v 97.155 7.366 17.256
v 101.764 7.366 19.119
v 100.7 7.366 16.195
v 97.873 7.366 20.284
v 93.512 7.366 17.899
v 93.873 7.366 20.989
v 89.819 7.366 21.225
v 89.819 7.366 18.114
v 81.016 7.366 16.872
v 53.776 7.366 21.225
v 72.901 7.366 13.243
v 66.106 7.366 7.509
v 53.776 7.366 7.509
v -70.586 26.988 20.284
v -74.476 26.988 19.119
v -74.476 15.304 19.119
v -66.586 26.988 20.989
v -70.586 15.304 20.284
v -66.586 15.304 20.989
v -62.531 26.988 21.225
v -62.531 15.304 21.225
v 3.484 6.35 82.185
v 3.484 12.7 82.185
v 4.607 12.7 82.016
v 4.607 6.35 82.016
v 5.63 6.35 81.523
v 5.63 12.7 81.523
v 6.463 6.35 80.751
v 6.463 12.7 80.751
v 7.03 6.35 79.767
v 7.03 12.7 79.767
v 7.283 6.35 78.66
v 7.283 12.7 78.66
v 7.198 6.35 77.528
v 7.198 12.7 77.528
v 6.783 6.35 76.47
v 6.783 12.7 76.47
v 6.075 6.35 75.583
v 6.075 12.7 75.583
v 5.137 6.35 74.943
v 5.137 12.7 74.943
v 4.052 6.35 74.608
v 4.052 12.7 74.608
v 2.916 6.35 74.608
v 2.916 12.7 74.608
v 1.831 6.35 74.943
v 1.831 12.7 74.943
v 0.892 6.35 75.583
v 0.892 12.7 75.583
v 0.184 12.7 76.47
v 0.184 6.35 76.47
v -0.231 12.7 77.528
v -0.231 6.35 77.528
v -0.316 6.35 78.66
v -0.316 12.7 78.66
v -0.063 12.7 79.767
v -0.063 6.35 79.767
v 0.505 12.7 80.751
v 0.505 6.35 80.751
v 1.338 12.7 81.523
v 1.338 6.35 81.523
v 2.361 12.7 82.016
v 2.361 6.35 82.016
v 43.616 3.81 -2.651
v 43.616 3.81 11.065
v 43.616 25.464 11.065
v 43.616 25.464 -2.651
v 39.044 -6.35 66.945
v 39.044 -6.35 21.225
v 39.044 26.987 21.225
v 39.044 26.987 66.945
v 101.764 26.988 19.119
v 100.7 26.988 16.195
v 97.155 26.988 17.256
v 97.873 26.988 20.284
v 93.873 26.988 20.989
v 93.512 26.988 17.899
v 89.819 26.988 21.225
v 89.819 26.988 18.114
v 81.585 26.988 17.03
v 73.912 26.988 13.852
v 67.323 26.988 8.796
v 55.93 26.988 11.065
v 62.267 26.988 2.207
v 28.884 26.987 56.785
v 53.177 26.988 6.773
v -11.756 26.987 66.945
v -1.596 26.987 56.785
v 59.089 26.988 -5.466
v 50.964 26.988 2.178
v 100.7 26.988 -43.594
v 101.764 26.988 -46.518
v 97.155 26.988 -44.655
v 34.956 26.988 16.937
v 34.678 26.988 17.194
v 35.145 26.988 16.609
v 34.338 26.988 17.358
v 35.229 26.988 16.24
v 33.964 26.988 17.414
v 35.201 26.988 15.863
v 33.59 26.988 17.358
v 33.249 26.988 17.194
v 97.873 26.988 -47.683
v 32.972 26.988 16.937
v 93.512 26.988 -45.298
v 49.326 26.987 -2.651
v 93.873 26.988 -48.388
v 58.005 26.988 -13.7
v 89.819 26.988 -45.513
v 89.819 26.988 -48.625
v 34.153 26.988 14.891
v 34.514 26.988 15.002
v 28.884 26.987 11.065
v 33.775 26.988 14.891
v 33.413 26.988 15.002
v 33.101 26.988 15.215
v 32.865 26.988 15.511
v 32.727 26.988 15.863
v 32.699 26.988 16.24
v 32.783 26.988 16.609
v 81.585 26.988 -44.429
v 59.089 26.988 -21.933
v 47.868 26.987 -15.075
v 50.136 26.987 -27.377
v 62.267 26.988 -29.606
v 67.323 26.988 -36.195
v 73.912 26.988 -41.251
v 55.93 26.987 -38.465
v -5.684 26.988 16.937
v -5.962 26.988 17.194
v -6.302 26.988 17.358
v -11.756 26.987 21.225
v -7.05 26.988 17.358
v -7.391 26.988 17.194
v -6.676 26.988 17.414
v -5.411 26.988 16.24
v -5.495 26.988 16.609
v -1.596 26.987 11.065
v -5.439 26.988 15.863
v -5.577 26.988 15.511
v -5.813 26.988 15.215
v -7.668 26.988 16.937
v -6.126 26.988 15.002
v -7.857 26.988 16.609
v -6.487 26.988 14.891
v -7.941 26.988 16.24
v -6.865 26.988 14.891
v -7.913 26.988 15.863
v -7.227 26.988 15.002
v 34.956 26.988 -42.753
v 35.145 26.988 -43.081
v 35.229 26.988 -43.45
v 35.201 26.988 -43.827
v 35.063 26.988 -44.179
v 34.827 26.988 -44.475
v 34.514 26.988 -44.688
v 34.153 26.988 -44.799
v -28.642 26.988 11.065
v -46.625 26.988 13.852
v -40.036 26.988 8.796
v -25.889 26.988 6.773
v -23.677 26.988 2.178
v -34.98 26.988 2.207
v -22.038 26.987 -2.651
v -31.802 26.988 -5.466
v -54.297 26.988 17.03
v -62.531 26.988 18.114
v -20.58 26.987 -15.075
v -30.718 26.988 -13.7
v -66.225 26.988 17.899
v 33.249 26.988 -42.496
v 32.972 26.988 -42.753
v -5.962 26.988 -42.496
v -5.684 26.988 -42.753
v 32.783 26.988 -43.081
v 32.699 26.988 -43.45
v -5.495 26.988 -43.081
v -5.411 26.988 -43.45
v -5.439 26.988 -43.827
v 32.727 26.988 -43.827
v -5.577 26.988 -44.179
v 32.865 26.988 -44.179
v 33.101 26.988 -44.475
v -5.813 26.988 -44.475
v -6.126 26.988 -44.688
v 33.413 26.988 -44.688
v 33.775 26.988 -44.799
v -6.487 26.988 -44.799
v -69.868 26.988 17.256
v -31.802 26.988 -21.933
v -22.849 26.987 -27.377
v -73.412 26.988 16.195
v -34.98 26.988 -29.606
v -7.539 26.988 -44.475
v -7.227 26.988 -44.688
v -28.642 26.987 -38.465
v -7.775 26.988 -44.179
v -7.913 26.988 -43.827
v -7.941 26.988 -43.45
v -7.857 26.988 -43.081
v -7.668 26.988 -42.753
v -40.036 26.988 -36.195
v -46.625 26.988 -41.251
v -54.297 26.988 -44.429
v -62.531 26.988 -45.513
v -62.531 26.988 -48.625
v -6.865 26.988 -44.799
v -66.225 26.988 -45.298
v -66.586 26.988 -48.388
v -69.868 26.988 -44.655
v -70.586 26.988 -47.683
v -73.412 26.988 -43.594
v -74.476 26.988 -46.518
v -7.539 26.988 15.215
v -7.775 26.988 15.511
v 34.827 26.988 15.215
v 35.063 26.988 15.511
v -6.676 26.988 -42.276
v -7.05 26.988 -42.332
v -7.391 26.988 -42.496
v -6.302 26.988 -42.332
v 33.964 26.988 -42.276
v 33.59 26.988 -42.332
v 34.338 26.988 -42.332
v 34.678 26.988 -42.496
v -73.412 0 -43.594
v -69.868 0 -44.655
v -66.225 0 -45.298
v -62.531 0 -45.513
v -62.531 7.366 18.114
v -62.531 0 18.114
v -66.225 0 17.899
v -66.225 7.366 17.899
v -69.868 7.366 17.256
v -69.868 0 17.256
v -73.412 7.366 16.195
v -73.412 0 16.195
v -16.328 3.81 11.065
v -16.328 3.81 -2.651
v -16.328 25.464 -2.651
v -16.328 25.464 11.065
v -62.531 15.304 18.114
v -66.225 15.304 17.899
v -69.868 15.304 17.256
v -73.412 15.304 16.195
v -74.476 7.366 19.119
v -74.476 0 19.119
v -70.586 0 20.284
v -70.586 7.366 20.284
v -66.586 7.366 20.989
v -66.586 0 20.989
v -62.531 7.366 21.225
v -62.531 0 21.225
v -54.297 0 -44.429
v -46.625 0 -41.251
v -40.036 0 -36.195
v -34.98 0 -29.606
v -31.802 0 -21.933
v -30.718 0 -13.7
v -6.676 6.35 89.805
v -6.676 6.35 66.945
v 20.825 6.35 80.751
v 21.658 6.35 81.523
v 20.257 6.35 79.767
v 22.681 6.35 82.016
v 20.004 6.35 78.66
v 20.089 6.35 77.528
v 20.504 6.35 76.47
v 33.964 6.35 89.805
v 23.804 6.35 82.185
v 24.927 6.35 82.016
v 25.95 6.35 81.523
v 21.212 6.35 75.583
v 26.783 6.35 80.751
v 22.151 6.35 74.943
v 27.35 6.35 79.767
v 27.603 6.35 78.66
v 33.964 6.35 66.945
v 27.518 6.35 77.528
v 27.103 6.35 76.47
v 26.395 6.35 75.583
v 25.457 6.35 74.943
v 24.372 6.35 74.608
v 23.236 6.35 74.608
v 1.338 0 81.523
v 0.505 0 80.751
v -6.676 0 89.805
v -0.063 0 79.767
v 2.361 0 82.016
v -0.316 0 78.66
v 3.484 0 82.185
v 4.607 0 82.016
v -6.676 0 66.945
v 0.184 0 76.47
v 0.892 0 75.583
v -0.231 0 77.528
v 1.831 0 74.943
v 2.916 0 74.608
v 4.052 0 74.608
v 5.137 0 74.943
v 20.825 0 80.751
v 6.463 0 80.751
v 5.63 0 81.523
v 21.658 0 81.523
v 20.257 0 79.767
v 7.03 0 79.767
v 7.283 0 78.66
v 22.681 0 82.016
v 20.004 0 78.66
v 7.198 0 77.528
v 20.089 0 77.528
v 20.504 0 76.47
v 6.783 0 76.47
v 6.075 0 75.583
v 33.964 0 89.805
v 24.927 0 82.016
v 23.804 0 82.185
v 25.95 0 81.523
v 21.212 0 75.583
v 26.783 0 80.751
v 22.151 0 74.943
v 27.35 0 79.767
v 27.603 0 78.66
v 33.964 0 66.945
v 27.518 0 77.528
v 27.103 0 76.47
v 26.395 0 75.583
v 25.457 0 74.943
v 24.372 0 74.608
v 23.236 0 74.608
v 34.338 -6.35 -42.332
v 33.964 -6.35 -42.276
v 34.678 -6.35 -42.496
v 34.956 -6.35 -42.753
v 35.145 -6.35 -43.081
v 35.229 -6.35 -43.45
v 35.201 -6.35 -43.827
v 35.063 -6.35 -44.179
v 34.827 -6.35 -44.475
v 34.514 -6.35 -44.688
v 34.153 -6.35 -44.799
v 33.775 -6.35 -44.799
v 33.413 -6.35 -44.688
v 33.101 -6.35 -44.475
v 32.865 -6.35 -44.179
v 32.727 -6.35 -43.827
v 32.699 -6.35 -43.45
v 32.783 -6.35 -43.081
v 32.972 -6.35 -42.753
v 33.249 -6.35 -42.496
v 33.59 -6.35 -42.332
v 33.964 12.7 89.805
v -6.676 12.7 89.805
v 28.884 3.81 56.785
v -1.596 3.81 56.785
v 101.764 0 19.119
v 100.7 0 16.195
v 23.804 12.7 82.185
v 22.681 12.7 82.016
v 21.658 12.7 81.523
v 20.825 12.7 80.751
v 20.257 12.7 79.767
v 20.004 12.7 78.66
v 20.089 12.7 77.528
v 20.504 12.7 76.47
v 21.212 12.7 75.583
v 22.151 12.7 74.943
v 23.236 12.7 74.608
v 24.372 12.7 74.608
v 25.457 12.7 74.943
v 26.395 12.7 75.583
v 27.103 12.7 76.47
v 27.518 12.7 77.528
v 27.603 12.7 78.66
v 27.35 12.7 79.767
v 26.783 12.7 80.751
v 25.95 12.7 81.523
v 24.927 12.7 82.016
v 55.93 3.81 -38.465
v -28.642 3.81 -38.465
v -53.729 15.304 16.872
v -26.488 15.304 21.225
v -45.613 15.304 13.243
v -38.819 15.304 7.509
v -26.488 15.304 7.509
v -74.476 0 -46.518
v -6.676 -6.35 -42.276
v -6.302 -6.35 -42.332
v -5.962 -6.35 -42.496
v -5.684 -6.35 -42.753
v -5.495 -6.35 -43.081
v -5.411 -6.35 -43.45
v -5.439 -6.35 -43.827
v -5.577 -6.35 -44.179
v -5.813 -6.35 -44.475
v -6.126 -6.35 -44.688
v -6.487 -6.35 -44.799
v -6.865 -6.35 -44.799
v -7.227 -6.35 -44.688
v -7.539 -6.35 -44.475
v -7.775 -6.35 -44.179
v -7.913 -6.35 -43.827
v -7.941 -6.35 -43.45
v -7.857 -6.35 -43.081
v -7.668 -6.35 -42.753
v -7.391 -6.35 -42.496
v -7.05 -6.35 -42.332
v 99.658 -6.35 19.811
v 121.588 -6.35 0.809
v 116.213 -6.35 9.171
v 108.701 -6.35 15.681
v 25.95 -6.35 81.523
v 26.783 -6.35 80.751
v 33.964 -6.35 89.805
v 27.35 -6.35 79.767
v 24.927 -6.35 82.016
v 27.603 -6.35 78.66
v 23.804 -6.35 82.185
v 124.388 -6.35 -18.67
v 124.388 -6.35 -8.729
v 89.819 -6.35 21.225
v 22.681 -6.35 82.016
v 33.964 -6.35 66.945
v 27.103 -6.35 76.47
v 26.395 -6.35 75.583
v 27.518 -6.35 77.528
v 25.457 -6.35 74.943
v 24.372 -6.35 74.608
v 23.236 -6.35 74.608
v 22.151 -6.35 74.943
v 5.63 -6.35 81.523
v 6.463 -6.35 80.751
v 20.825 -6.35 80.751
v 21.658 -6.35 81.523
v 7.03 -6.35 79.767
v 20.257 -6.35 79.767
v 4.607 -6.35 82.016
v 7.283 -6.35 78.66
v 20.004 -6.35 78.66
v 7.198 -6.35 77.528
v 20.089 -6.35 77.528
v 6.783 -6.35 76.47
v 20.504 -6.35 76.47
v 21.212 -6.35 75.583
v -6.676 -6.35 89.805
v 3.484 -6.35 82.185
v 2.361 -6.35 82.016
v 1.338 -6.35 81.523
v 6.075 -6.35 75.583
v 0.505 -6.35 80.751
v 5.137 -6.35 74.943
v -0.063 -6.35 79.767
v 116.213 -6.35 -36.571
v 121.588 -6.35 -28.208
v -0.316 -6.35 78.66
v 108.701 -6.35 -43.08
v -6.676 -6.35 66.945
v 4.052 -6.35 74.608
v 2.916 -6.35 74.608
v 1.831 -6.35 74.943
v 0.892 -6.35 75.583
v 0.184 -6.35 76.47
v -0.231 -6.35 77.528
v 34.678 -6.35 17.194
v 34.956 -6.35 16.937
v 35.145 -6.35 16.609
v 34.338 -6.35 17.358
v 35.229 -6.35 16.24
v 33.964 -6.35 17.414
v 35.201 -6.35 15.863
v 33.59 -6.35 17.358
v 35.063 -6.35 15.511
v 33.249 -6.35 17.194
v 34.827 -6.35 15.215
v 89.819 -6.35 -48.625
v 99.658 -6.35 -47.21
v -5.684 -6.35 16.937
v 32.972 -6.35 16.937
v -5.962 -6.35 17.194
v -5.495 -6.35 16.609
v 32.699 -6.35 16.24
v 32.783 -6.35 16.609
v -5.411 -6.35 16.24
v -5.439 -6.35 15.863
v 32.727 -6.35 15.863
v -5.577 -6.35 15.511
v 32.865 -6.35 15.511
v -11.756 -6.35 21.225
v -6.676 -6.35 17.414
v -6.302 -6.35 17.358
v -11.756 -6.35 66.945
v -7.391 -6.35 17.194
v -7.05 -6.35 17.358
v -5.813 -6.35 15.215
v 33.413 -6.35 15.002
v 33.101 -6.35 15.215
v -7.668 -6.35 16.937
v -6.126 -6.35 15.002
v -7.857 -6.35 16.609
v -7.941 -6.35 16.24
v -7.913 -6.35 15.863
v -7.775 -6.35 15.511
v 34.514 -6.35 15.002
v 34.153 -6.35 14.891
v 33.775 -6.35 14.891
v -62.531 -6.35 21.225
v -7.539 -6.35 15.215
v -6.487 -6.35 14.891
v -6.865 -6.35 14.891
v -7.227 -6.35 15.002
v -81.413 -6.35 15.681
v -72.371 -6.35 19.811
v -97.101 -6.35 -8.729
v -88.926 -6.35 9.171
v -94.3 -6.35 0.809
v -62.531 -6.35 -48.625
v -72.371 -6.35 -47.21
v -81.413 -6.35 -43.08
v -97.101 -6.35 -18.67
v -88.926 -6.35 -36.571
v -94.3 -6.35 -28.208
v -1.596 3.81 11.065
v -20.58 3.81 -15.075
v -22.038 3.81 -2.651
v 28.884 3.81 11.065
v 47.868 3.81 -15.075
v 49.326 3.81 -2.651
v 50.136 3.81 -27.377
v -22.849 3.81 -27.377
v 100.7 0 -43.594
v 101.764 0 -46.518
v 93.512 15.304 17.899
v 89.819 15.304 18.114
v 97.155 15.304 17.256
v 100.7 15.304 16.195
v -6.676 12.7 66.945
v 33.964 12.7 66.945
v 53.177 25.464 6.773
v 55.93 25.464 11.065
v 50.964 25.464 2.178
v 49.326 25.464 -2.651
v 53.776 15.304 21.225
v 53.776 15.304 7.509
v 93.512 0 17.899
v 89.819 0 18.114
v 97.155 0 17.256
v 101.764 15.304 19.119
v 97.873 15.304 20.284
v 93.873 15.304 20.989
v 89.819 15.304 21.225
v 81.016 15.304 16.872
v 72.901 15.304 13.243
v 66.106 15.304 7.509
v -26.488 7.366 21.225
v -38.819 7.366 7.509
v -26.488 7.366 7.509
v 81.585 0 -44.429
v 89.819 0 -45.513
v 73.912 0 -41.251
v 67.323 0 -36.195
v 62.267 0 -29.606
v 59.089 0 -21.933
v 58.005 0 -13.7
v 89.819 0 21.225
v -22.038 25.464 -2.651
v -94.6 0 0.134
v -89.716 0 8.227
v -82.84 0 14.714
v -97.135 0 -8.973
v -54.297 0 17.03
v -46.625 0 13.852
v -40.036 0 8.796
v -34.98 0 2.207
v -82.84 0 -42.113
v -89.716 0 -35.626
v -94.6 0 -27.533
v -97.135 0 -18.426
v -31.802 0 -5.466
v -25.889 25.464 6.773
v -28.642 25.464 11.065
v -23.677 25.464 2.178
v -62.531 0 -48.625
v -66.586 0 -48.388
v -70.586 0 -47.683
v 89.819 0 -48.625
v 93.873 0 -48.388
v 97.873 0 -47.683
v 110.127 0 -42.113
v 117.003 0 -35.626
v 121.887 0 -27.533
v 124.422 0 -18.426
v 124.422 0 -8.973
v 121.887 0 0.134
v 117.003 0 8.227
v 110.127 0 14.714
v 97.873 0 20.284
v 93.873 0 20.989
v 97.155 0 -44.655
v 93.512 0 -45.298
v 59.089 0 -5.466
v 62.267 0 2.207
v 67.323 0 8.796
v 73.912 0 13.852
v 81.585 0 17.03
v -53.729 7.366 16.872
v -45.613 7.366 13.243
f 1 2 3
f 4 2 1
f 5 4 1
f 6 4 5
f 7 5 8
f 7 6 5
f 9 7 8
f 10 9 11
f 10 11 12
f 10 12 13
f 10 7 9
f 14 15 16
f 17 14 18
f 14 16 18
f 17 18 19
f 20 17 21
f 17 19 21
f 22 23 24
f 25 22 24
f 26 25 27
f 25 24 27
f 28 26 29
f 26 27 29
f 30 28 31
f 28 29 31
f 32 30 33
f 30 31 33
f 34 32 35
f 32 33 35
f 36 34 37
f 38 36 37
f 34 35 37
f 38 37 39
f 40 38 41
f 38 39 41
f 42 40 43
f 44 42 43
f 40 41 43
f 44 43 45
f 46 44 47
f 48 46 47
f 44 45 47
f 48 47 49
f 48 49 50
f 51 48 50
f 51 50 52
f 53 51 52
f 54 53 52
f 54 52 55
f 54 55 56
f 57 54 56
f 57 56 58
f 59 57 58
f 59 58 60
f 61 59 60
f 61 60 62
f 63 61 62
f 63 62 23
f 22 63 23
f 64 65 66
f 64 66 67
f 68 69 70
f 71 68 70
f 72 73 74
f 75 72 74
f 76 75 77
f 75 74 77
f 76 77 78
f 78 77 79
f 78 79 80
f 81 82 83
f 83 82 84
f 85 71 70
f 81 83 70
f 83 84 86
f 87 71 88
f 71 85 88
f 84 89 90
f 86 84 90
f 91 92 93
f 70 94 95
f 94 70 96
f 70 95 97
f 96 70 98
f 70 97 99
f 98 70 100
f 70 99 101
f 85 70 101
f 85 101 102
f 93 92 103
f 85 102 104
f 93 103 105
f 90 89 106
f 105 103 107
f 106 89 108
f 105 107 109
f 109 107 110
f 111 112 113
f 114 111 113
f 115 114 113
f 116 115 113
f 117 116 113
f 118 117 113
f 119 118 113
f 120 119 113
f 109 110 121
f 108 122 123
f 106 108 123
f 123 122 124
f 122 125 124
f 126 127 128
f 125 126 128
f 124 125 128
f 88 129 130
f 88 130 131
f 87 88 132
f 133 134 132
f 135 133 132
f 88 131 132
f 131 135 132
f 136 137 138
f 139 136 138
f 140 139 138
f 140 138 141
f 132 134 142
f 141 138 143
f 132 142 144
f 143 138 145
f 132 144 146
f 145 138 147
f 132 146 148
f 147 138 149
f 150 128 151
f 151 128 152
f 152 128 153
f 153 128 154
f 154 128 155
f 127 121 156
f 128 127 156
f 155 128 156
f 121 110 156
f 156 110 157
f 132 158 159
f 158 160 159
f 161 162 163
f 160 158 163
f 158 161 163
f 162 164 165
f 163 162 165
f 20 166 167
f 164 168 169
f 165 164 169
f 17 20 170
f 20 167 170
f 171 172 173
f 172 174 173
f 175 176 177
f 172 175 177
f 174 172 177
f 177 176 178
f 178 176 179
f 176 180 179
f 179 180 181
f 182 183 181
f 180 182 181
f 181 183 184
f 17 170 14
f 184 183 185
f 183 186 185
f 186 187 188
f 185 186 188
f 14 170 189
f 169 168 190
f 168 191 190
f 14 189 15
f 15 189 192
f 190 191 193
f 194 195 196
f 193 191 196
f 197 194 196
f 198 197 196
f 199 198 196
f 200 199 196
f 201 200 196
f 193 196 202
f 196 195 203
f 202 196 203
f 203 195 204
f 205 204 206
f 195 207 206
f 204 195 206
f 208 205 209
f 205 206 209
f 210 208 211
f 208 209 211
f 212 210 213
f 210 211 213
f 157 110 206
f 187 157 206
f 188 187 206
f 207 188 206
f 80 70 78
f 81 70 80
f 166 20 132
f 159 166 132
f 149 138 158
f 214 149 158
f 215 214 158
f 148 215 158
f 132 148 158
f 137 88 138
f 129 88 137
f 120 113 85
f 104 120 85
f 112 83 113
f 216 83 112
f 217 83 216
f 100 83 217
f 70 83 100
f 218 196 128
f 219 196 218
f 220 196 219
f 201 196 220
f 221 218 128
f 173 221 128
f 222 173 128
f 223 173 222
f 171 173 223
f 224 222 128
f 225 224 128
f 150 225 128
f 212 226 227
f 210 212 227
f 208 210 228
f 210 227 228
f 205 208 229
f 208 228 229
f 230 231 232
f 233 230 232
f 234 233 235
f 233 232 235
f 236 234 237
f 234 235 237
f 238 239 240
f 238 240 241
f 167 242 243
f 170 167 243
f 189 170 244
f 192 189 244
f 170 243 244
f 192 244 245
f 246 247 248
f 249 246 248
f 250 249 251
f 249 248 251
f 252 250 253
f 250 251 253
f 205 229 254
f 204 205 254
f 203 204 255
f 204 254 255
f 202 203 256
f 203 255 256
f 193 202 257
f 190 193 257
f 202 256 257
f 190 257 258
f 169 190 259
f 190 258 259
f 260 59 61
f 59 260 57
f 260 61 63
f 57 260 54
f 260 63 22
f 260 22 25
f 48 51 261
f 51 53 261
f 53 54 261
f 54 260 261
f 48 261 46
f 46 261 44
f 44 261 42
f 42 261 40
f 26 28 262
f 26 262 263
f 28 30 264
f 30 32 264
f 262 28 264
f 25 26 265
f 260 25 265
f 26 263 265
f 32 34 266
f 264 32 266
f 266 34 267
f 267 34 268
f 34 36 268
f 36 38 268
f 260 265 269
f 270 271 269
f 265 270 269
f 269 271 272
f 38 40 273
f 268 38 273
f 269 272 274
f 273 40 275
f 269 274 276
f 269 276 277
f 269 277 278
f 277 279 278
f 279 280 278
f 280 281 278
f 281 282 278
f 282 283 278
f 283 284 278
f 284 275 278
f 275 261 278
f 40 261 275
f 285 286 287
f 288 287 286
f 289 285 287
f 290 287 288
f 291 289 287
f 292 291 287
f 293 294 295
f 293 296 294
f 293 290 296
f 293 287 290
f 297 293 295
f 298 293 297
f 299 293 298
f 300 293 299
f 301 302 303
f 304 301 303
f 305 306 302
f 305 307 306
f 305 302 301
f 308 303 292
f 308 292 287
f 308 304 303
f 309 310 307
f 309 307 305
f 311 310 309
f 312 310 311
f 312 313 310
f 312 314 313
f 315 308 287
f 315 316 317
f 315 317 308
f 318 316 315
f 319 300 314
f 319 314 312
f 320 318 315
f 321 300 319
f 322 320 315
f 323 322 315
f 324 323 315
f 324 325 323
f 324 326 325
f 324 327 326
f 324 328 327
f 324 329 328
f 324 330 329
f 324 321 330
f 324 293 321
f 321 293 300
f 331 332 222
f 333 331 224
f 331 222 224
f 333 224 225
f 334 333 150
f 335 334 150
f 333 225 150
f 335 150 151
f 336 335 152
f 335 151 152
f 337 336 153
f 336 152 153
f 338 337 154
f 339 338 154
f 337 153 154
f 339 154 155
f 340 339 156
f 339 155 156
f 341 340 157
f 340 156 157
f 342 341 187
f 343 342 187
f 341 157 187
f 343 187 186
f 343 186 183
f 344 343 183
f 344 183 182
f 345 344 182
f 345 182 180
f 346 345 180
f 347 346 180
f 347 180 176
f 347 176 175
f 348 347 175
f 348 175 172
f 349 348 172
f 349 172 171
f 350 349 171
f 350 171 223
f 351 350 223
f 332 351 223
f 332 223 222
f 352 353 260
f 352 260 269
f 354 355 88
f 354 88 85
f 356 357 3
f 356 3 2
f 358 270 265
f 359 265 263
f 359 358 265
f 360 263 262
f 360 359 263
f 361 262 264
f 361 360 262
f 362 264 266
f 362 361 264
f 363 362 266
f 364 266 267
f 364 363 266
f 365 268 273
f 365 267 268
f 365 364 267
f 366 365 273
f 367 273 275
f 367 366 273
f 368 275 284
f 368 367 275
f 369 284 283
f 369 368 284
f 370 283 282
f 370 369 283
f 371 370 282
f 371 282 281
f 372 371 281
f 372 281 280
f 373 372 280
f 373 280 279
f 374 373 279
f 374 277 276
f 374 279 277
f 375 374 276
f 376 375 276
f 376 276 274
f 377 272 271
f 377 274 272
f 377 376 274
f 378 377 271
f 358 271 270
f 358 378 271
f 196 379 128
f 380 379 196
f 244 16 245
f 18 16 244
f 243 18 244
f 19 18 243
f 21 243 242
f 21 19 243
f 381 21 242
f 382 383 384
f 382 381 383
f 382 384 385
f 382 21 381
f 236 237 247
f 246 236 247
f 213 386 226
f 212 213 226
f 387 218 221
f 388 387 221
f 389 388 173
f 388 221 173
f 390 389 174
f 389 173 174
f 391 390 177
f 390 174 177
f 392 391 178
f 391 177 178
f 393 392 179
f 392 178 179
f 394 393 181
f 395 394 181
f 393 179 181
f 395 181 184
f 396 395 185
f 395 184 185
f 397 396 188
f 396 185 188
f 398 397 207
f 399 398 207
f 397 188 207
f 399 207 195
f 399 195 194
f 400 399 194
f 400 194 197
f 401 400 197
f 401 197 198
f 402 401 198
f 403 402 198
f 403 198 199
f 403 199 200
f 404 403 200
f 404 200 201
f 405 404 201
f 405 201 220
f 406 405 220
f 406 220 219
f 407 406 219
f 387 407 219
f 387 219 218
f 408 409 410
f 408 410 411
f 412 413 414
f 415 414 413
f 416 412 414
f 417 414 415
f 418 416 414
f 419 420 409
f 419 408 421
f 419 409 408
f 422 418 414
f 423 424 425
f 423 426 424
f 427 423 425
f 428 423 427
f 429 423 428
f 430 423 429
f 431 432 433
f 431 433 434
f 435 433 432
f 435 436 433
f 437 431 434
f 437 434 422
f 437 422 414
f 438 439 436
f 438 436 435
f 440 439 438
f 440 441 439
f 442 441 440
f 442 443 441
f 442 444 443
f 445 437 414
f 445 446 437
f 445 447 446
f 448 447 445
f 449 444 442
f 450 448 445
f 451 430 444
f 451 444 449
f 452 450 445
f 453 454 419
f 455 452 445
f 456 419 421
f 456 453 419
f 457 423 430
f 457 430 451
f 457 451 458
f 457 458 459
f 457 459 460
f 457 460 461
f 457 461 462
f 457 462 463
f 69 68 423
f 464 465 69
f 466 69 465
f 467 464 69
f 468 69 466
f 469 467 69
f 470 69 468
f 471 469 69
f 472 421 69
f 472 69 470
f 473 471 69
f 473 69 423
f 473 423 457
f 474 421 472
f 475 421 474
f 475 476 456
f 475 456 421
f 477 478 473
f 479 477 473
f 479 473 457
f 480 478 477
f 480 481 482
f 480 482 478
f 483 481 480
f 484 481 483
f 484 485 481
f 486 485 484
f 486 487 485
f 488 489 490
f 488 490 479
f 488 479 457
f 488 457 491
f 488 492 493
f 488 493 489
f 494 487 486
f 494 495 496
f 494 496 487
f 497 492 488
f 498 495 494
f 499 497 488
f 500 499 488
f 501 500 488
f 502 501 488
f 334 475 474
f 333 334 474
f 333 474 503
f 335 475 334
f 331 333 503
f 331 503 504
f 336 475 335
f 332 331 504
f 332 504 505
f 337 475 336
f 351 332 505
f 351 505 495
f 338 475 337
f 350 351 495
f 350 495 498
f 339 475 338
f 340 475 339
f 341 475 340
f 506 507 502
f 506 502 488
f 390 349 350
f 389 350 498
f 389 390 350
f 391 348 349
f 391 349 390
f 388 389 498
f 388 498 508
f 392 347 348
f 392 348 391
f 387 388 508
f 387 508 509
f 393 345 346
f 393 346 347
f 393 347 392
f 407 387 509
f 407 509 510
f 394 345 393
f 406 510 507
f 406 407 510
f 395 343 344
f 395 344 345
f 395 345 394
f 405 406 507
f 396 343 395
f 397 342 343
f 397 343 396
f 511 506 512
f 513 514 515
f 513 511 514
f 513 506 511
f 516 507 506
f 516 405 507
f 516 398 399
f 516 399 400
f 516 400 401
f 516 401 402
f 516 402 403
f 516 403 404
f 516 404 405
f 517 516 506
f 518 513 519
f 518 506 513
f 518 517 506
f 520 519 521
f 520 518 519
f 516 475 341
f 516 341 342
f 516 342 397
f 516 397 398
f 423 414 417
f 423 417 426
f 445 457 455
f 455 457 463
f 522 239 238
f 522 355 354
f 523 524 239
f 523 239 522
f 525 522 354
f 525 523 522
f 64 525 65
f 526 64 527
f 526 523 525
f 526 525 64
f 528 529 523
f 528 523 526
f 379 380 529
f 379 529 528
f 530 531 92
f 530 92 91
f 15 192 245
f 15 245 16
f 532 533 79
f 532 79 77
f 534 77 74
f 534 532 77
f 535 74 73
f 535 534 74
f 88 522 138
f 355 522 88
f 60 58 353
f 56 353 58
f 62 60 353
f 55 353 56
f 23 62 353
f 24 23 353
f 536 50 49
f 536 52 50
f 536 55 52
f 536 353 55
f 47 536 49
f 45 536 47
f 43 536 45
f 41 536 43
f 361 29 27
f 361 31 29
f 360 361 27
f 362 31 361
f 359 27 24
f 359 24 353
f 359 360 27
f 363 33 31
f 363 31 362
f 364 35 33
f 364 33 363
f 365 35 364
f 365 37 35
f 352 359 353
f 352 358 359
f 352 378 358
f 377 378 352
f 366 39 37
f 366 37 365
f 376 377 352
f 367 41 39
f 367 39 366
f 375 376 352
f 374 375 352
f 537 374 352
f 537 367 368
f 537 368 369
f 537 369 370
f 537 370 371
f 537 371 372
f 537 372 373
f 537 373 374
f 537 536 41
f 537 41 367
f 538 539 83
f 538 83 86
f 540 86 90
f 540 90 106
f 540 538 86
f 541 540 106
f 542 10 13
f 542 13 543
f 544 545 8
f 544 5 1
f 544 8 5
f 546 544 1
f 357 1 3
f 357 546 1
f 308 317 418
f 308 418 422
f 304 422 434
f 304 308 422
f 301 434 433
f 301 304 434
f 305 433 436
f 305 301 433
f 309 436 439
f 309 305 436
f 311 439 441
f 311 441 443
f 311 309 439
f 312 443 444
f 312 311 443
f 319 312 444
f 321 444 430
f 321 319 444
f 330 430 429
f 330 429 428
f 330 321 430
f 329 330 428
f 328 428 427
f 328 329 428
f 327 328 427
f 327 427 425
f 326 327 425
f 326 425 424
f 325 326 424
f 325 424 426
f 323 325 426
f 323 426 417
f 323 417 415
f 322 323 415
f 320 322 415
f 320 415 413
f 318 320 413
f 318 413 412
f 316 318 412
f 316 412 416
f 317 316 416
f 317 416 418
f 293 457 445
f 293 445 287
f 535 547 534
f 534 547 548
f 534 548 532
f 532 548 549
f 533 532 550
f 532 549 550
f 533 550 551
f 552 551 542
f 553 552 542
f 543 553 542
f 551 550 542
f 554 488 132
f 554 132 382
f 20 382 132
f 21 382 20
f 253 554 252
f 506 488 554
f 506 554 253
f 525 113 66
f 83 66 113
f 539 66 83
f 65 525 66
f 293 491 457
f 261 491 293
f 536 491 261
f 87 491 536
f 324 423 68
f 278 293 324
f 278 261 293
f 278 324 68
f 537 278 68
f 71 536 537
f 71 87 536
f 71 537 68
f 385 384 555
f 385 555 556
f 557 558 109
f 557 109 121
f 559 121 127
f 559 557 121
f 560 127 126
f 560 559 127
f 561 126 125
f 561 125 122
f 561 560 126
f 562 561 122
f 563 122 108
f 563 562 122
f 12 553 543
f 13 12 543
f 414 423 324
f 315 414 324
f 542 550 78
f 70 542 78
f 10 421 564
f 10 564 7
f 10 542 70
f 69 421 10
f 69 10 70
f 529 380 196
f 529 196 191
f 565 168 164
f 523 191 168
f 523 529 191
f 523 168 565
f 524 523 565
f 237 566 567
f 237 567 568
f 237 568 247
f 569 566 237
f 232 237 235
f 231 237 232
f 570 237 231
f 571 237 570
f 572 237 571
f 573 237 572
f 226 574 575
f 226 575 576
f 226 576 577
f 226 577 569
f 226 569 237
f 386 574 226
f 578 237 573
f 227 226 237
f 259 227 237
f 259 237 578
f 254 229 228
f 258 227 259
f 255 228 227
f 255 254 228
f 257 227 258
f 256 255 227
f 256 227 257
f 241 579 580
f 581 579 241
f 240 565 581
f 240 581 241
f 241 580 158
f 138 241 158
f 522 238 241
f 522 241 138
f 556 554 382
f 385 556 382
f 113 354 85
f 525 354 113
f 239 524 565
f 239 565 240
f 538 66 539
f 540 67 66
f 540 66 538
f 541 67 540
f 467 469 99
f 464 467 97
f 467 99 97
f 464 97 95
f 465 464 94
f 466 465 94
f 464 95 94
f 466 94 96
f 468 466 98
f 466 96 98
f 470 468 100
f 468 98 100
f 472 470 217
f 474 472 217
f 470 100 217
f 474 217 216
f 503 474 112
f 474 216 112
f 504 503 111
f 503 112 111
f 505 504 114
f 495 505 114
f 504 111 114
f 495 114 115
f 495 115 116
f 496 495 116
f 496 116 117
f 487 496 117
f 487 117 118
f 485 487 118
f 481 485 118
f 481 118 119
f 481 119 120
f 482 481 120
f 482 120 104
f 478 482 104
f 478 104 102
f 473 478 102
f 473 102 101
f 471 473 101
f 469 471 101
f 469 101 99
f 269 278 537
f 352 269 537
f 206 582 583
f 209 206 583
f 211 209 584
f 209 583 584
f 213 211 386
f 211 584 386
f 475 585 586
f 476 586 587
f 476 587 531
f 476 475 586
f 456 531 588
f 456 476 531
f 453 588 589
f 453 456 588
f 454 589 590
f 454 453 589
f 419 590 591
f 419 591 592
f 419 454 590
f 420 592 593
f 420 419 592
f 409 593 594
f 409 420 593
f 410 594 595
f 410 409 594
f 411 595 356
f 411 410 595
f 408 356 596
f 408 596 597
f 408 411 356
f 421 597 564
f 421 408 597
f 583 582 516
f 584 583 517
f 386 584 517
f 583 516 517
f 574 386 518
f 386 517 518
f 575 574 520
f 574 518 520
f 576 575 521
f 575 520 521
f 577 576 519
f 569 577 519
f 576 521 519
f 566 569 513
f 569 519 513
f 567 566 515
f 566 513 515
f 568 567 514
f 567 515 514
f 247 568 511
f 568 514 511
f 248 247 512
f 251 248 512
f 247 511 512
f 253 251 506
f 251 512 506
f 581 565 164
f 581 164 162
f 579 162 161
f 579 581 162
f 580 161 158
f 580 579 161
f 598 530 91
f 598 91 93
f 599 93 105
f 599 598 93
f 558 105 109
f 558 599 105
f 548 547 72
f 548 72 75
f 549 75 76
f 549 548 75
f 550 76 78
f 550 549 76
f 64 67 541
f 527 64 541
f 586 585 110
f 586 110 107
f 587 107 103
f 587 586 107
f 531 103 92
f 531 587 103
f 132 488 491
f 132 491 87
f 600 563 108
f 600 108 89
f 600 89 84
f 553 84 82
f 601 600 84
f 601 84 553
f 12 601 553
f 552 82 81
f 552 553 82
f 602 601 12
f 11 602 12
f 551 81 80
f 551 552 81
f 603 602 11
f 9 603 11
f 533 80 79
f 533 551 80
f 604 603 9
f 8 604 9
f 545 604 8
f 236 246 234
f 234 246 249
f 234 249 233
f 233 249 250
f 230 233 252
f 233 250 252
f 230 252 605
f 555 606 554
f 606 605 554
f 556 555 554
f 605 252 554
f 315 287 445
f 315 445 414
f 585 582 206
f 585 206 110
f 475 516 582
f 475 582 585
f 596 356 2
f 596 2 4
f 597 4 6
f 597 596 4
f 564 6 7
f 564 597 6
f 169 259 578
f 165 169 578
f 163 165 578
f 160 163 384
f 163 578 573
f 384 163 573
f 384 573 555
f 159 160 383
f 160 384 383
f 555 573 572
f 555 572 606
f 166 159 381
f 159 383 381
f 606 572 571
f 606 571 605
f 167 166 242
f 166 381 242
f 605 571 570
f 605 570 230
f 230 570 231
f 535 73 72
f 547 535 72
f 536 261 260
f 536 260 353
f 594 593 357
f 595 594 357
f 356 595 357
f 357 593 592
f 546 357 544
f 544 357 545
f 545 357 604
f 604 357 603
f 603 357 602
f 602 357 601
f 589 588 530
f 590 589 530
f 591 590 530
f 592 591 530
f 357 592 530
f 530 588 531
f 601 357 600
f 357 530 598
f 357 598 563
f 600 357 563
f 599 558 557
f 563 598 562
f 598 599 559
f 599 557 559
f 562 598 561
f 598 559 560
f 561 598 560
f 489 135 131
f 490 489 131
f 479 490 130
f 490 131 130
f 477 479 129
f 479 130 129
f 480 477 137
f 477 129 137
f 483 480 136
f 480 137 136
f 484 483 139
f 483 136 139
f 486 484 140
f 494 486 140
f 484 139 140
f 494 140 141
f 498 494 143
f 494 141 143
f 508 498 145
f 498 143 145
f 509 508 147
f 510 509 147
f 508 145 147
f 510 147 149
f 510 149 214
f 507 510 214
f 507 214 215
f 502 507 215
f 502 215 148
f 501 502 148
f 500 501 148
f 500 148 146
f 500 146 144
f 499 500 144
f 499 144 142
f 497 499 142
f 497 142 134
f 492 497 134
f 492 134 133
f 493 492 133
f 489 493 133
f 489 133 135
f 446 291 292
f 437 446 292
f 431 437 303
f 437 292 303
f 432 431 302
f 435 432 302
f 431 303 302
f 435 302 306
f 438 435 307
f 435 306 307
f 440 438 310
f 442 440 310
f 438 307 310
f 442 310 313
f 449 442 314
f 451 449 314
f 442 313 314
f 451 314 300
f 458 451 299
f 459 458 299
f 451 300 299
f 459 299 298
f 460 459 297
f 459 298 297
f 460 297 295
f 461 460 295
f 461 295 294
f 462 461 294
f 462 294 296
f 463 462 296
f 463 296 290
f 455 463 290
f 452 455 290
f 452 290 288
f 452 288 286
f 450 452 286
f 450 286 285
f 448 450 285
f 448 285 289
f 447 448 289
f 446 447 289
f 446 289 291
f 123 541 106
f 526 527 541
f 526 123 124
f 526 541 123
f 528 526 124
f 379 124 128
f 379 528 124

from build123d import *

# Parameters (mm, degrees)
BOSS_EXTRUDE1_DEPTH = 26.9875
BOSS_EXTRUDE5_START = -6.35
BOSS_EXTRUDE5_DEPTH = 6.35
SKETCH3_W           = 25.4
SKETCH3_H           = 33.3375
BOSS_EXTRUDE7_DEPTH = 45.72
SKETCH6_W           = 8.89
SKETCH6_H           = 33.3375
BOSS_EXTRUDE8_DEPTH = 22.86
SKETCH7_W           = 22.86
SKETCH7_H           = 14.5415
SKETCH7_H_2         = 6.604
CUT_EXTRUDE1_DEPTH  = 21.082
SKETCH11_W          = 51.2557102
SKETCH11_H          = 7.9375
CUT_EXTRUDE3_DEPTH  = 13.716
SHELL1_START        = 3.81
SHELL1_DEPTH        = 23.1775
SHELL1_START_2      = 25.4635
SHELL1_2_DEPTH      = 1.524
SKETCH13_R          = 1.26873
CUT_EXTRUDE4_DEPTH  = 35.56
SKETCH14_W          = 40.64
SKETCH14_H          = 6.35
BOSS_EXTRUDE9_DEPTH = 22.86
CUT_EXTRUDE5_REACH  = 156.884
SKETCH16_R          = 3.81


# Read off the part's stored shape, not the designer's step: Shell1
with BuildPart() as part:
    # Sketch1 → Boss-Extrude1 (new body)
    with BuildSketch(Plane(origin=(0, 0, 0), x_dir=(1, 0, 0), z_dir=(0, 1, 0))):
        with BuildLine():
            ThreePointArc((-27.606252307, 13.699523808), (-37.835547974, 38.395228141), (-62.531252307, 48.624523808))
            Line((-62.531252307, 48.624523808), (-62.531252307, 45.513023808))
            ThreePointArc((-62.531252307, 45.513023808), (-40.035710723, 36.195065391), (-30.717752307, 13.699523808))
            ThreePointArc((-30.717752307, 13.699523808), (-40.035710723, -8.796017775), (-62.531252307, -18.113976192))
            Line((-62.531252307, -18.113976192), (-62.531252307, -21.225476192))
            ThreePointArc((-62.531252307, -21.225476192), (-37.835547974, -10.996180525), (-27.606252307, 13.699523808))
        make_face()
        with BuildLine():
            Line((-62.531252307, 45.513023808), (-62.531252307, 48.624523808))
            ThreePointArc((-62.531252307, 48.624523808), (-68.595914912, 48.093934582), (-74.476305812, 46.518288589))
            Line((-74.476305812, 46.518288589), (-73.412110136, 43.594434999))
            ThreePointArc((-73.412110136, 43.594434999), (-68.055608607, 45.029705258), (-62.531252307, 45.513023808))
        make_face()
        with BuildLine():
            ThreePointArc((-74.476305812, -19.119240973), (-68.595914912, -20.694886966), (-62.531252307, -21.225476192))
            Line((-62.531252307, -21.225476192), (-62.531252307, -18.113976192))
            ThreePointArc((-62.531252307, -18.113976192), (-68.055608607, -17.630657643), (-73.412110136, -16.195387383))
            Line((-73.412110136, -16.195387383), (-74.476305812, -19.119240973))
        make_face()
        with BuildLine():
            Line((13.643756331, 48.624523808), (-62.531252307, 48.624523808))
            ThreePointArc((-62.531252307, 48.624523808), (-37.835547974, 38.395228141), (-27.606252307, 13.699523808))
            ThreePointArc((-27.606252307, 13.699523808), (-37.835547974, -10.996180525), (-62.531252307, -21.225476192))
            Line((-62.531252307, -21.225476192), (13.643756331, -21.225476192))
            Line((13.643756331, -21.225476192), (13.643756331, 48.624523808))
        make_face()
    boss_extrude1 = extrude(amount=BOSS_EXTRUDE1_DEPTH)

    # Sketch1<5> → Boss-Extrude5 (add)
    with BuildSketch(Plane(origin=(0, 0, 0), x_dir=(1, 0, 0), z_dir=(0, 1, 0)).offset(BOSS_EXTRUDE5_START)):
        with BuildLine():
            Line((-62.531252307, -21.225476192), (13.643756331, -21.225476192))
            Line((13.643756331, -21.225476192), (13.643756331, 48.624523808))
            Line((13.643756331, 48.624523808), (-62.531252307, 48.624523808))
            ThreePointArc((-62.531252307, 48.624523808), (-97.456252307, 13.699523808), (-62.531252307, -21.225476192))
        make_face()
    boss_extrude5 = extrude(amount=BOSS_EXTRUDE5_DEPTH)

    # Mirror1: Boss-Extrude1, Boss-Extrude5 across plane
    add(boss_extrude1.mirror(Plane(origin=(13.643756331, 26.9875, 0), x_dir=(0, 0, 1), z_dir=(1, 0, 0))))
    add(boss_extrude5.mirror(Plane(origin=(13.643756331, 26.9875, 0), x_dir=(0, 0, 1), z_dir=(1, 0, 0))))

    # Sketch3 → Boss-Extrude7 (add)
    with BuildSketch(Plane.XY.offset(21.225476192)):
        with Locations((0.943756331, 10.31875)):
            Rectangle(SKETCH3_W, SKETCH3_H)
        with Locations((26.343756331, 10.31875)):
            Rectangle(SKETCH3_W, SKETCH3_H)
    extrude(amount=BOSS_EXTRUDE7_DEPTH)

    # Sketch6 → Boss-Extrude8 (add)
    with BuildSketch(Plane.XY.offset(66.945476192)):
        with Locations((9.198756331, 10.31875)):
            Rectangle(SKETCH6_W, SKETCH6_H)
        with Locations((18.088756331, 10.31875)):
            Rectangle(SKETCH6_W, SKETCH6_H)
    extrude(amount=BOSS_EXTRUDE8_DEPTH)

    # Sketch7 → Cut-Extrude1 (cut)
    with BuildSketch(Plane.ZY.offset(-4.753756331)):
        with Locations((78.375476192, 19.71675)):
            Rectangle(SKETCH7_W, SKETCH7_H)
        with Locations((78.375476192, 3.048)):
            Rectangle(SKETCH7_W, SKETCH7_H_2)
    extrude(amount=-CUT_EXTRUDE1_DEPTH, mode=Mode.SUBTRACT)

    # Sketch11 → Cut-Extrude3 (cut)
    with BuildSketch(Plane.XY.offset(21.225476192)):
        with Locations((-52.116098769, 11.33475)):
            Rectangle(SKETCH11_W, SKETCH11_H)
    cut_extrude3 = extrude(amount=-CUT_EXTRUDE3_DEPTH, mode=Mode.SUBTRACT)

    # Mirror2: Cut-Extrude3 across plane
    add(cut_extrude3.mirror(Plane(origin=(13.64376748, 0, 0), x_dir=(0, 0, 1), z_dir=(1, 0, 0))), mode=Mode.SUBTRACT)

    # Shell1 outline → Shell1 (cut)
    with BuildSketch(Plane(origin=(0, 0, 0), x_dir=(1, 0, 0), z_dir=(0, 1, 0)).offset(SHELL1_START)):
        with BuildLine():
            Line((-16.328243669, 2.650523808), (-16.328243669, -11.065476192))
            Line((-16.328243669, -11.065476192), (-1.596243669, -11.065476192))
            Line((-1.596243669, -11.065476192), (-1.596243669, -56.785476192))
            Line((-1.596243669, -56.785476192), (28.883756331, -56.785476192))
            Line((28.883756331, -56.785476192), (28.883756331, -11.065476192))
            Line((28.883756331, -11.065476192), (43.615778629, -11.065476192))
            Line((43.615778629, -11.065476192), (43.615778629, 2.650523808))
            Line((43.615778629, 2.650523808), (49.325626028, 2.650523808))
            ThreePointArc((49.325626028, 2.650523808), (48.541178718, 21.311066068), (55.929688893, 38.464523808))
            Line((55.929688893, 38.464523808), (-28.642176231, 38.464523808))
            ThreePointArc((-28.642176231, 38.464523808), (-21.253666056, 21.311066068), (-22.038113366, 2.650523808))
            Line((-22.038113366, 2.650523808), (-16.328243669, 2.650523808))
        make_face()
    extrude(amount=SHELL1_DEPTH, mode=Mode.SUBTRACT)

    # Shell1 2 outline → Shell1 2 (cut)
    with BuildSketch(Plane(origin=(0, 0, 0), x_dir=(1, 0, 0), z_dir=(0, 1, 0)).offset(SHELL1_START_2)):
        with BuildLine():
            ThreePointArc((-22.038113366, 2.650523808), (-24.713126472, -4.509376779), (-28.642176231, -11.065476192))
            Line((-28.642176231, -11.065476192), (-16.328243669, -11.065476192))
            Line((-16.328243669, -11.065476192), (-16.328243669, 2.650523808))
            Line((-16.328243669, 2.650523808), (-22.038113366, 2.650523808))
        make_face()
        with BuildLine():
            ThreePointArc((55.929688893, -11.065476192), (52.000639133, -4.509376779), (49.325626028, 2.650523808))
            Line((49.325626028, 2.650523808), (43.615778629, 2.650523808))
            Line((43.615778629, 2.650523808), (43.615778629, -11.065476192))
            Line((43.615778629, -11.065476192), (55.929688893, -11.065476192))
        make_face()
    extrude(amount=SHELL1_2_DEPTH, mode=Mode.SUBTRACT)

    # Sketch13 → Cut-Extrude4 (cut)
    with BuildSketch(Plane(origin=(0, 26.9875, 0), x_dir=(1, 0, 0), z_dir=(0, 1, 0))):
        with Locations(Location((33.963756331, -16.145476192, 0), (0, 0, 270))):
            Circle(SKETCH13_R)
        with Locations(Location((-6.676243669, -16.145476192, 0), (0, 0, 270))):
            Circle(SKETCH13_R)
        with Locations(Location((-6.676243669, 43.544523808, 0), (0, 0, 270))):
            Circle(SKETCH13_R)
        with Locations(Location((33.963756331, 43.544523808, 0), (0, 0, 270))):
            Circle(SKETCH13_R)
    extrude(amount=-CUT_EXTRUDE4_DEPTH, mode=Mode.SUBTRACT)

    # Sketch14 → Boss-Extrude9 (add)
    with BuildSketch(Plane.XY.offset(66.945476192)):
        with Locations((13.64376748, 9.525)):
            Rectangle(SKETCH14_W, SKETCH14_H)
        with Locations((13.64376748, -3.175)):
            Rectangle(SKETCH14_W, SKETCH14_H)
    extrude(amount=BOSS_EXTRUDE9_DEPTH)

    # Cut-Extrude5: up to this face of the body (flat: up to its plane)
    cut_extrude5_end = Plane(part.part.faces().sort_by_distance((13.643756916, -6.35, -1.287747725))[0])
    # Sketch16 → Cut-Extrude5 (cut, up to the picked face)
    with BuildSketch(Plane(origin=(0, 12.7, 0), x_dir=(1, 0, 0), z_dir=(0, 1, 0)), mode=Mode.PRIVATE) as cut_extrude5_sk1:
        with Locations(Location((3.48376748, -78.375476192, 0), (0, 0, 270))):
            Circle(SKETCH16_R)
    cut_extrude5_tool1 = split(extrude(cut_extrude5_sk1.sketch, amount=-CUT_EXTRUDE5_REACH, mode=Mode.PRIVATE), bisect_by=cut_extrude5_end, keep=Keep.BOTH, mode=Mode.PRIVATE)
    cut_extrude5 = cut_extrude5_tool1.solids().sort_by(Axis((3.483767, 12.7, 78.375476), (0, -1, 0)))[0]
    add(cut_extrude5, mode=Mode.SUBTRACT)

    # Mirror3: Cut-Extrude5 across plane
    add(cut_extrude5.mirror(Plane(origin=(13.64376748, 0, 0), x_dir=(0, 0, 1), z_dir=(1, 0, 0))), mode=Mode.SUBTRACT)


solid = part.part
